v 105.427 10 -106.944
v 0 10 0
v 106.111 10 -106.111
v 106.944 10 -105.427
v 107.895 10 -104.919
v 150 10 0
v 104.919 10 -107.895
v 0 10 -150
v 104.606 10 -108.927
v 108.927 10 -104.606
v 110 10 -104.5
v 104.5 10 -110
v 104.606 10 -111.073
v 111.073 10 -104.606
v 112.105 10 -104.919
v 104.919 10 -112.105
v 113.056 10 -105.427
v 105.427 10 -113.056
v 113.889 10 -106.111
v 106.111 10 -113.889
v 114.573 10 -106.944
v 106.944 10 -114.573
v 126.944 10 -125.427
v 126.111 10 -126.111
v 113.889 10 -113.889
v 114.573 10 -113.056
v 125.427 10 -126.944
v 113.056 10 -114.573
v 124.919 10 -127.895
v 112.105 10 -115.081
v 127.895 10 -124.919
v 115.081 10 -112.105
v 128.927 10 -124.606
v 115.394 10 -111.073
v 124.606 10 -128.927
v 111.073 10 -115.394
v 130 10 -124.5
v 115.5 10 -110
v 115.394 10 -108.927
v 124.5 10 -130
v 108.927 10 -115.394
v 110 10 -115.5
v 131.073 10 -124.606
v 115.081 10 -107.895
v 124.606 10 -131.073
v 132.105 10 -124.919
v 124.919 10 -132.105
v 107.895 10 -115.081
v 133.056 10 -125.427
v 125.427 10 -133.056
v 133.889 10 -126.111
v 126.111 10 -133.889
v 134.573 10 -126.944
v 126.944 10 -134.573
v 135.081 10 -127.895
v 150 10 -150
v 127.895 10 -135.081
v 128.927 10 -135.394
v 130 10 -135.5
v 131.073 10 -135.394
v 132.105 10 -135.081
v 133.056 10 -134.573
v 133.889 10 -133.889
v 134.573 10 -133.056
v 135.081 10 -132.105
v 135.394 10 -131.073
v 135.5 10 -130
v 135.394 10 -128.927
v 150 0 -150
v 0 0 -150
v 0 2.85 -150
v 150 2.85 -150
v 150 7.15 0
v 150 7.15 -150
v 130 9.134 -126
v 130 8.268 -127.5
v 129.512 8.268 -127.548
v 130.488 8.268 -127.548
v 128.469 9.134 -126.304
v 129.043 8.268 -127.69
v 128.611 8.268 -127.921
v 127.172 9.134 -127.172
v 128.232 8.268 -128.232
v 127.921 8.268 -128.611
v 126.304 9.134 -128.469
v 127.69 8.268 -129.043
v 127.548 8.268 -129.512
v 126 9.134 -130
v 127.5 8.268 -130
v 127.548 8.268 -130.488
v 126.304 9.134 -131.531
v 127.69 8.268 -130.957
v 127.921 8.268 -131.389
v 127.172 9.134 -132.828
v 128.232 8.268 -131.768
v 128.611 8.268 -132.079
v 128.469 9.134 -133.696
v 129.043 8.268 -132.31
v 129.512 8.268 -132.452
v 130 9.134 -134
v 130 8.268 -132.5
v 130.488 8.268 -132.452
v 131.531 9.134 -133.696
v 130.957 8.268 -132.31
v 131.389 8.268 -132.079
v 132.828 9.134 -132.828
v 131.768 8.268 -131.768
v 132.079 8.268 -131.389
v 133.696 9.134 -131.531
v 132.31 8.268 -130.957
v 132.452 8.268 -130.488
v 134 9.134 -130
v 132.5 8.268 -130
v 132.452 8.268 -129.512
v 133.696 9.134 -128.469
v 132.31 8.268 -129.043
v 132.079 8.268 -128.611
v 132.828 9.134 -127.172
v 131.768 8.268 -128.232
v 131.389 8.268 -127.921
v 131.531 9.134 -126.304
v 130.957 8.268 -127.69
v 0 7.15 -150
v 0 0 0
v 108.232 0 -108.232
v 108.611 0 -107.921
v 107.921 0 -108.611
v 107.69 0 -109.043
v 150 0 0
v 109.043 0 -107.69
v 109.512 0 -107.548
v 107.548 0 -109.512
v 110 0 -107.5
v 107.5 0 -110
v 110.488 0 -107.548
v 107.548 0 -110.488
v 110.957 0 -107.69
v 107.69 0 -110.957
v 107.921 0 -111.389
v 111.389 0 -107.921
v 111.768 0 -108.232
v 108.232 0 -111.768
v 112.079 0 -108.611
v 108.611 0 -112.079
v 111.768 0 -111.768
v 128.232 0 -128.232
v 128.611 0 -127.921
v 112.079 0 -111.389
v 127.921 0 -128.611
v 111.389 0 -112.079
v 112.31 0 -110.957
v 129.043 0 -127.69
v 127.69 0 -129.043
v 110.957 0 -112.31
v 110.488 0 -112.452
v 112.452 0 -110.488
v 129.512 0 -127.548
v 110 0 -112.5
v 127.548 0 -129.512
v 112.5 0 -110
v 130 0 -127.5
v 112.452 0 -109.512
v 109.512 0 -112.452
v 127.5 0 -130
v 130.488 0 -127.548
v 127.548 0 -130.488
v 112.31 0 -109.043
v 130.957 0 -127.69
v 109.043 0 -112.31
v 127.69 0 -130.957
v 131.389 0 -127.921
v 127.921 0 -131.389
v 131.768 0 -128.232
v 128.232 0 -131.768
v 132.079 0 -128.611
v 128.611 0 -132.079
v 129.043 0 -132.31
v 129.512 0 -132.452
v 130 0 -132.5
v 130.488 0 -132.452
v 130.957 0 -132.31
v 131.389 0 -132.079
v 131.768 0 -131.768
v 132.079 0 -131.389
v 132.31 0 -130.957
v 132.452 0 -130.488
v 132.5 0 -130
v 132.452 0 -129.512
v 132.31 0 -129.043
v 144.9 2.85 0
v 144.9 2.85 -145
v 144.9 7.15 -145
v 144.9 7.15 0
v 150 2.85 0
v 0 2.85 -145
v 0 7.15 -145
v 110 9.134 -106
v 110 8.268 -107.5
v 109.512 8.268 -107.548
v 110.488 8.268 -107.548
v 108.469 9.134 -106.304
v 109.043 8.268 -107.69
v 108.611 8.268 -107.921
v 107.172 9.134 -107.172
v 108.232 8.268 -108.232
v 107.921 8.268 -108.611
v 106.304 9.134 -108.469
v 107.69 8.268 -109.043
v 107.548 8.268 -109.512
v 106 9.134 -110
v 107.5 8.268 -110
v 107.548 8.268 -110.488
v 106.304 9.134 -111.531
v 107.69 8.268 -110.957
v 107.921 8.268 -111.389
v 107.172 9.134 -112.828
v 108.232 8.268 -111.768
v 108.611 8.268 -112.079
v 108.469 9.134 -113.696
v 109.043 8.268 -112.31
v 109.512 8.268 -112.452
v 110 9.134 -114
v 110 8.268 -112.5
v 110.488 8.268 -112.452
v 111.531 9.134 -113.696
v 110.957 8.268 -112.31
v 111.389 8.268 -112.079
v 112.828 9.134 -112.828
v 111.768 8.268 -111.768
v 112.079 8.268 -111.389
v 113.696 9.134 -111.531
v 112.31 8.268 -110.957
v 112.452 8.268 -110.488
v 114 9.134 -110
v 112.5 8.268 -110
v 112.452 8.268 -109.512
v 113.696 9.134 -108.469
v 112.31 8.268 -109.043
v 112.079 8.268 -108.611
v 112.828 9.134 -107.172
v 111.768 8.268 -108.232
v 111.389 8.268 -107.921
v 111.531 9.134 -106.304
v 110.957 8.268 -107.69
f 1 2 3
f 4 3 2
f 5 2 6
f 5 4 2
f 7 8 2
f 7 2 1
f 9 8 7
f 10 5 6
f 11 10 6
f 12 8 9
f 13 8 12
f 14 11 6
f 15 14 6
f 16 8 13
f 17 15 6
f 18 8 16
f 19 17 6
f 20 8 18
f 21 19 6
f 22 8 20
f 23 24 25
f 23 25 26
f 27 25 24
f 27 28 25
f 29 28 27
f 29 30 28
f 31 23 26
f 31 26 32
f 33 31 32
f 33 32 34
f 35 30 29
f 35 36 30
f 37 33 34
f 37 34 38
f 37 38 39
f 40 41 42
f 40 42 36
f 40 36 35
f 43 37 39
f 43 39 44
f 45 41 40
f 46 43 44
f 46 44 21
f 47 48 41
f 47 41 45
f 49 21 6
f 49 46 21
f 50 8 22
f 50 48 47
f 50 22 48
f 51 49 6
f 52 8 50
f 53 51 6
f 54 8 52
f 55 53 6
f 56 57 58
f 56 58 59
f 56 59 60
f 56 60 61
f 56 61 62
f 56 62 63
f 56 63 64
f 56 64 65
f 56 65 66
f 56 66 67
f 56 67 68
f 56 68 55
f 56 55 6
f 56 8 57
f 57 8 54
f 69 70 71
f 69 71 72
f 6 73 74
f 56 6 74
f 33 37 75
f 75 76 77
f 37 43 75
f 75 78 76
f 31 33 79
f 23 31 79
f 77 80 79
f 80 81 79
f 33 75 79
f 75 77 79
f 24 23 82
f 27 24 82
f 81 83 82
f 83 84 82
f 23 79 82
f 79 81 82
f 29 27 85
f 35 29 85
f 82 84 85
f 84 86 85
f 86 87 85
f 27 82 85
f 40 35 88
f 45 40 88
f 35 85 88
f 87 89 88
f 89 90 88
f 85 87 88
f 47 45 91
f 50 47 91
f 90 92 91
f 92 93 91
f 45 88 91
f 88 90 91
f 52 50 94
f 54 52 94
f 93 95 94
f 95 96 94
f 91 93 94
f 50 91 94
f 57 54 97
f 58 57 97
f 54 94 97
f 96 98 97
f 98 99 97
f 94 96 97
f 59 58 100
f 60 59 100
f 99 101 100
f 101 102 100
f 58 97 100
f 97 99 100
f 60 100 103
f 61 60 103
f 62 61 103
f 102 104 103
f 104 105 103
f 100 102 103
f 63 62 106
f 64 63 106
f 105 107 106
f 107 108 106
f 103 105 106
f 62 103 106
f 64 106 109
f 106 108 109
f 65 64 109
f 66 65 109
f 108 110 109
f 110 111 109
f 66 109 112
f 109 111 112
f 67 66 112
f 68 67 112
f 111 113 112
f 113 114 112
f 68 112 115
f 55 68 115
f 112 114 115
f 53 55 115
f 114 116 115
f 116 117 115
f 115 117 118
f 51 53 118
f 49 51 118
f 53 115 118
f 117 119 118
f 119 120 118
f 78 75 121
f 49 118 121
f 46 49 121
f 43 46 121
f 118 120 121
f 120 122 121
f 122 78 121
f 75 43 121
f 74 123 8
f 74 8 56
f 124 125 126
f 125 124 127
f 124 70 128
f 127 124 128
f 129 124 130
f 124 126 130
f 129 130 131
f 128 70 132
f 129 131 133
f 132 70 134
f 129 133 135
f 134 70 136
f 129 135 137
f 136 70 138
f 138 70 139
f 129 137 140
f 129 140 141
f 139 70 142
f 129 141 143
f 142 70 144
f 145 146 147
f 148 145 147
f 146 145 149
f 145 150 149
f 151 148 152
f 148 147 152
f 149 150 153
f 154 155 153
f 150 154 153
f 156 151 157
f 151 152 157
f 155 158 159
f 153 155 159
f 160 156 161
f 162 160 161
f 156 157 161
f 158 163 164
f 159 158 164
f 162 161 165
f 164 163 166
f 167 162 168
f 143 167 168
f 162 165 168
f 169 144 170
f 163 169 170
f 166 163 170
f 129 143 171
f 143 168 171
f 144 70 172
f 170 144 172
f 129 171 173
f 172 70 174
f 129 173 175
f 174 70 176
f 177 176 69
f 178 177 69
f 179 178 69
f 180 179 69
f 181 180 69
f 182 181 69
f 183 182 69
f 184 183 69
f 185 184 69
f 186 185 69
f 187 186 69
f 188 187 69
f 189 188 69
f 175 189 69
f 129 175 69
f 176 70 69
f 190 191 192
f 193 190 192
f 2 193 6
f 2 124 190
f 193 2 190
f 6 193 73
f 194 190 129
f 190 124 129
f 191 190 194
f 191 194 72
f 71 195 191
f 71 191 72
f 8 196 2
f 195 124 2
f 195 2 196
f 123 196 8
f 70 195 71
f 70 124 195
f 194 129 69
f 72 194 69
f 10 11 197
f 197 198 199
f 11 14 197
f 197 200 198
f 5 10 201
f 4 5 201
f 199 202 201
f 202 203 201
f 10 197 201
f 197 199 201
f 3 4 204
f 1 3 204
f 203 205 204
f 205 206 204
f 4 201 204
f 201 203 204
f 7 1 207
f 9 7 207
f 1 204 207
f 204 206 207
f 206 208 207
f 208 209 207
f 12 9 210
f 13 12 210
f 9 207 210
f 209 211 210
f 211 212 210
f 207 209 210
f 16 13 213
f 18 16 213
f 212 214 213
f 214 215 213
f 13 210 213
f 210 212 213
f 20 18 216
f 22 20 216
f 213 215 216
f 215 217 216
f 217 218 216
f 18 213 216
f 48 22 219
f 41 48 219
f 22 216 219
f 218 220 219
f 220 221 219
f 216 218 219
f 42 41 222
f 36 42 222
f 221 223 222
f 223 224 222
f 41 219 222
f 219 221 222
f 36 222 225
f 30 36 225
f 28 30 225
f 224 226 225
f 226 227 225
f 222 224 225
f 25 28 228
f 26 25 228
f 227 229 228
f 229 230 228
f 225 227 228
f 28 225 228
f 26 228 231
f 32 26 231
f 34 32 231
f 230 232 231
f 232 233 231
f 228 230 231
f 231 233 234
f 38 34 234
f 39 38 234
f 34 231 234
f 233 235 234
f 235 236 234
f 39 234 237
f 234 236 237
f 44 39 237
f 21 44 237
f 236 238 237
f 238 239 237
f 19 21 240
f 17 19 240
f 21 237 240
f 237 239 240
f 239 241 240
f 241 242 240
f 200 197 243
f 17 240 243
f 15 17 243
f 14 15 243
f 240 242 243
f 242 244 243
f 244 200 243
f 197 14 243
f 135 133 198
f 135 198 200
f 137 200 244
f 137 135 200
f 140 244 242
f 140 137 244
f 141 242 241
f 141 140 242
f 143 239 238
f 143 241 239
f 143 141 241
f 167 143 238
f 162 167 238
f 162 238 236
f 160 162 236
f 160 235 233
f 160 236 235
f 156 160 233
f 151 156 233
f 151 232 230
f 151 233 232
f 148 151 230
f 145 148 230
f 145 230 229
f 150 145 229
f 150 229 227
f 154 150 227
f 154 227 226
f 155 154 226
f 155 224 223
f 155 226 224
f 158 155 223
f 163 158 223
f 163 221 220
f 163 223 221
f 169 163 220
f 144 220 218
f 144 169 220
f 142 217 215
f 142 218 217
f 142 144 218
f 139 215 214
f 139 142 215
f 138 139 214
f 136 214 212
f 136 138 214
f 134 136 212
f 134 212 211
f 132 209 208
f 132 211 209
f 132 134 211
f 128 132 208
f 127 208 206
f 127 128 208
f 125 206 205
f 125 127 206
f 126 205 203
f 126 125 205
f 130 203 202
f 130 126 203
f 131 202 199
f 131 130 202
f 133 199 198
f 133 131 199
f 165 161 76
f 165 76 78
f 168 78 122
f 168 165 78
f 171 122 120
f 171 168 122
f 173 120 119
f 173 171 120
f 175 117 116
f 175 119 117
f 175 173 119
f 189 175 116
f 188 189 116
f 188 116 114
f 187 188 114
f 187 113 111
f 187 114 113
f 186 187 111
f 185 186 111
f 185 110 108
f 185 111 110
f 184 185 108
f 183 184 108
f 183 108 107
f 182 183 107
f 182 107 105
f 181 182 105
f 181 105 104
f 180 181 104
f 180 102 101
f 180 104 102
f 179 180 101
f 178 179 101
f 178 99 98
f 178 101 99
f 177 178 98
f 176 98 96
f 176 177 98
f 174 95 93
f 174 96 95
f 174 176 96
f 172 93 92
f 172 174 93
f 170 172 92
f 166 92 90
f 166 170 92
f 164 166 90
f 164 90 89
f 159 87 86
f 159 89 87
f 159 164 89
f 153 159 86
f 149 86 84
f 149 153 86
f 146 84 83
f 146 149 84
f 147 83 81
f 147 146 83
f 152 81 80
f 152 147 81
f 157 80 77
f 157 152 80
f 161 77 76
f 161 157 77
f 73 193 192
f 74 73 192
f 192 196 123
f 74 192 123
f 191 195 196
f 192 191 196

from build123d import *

# Parameters (mm, degrees)
SKETCH1_W               = 150
SKETCH1_H               = 150
BOSS_EXTRUDE1_DEPTH     = 10
CUT_EXTRUDE1_DEPTH      = 213.367605816
CUT_EXTRUDE1_DEPTH_BACK = 213.367605816
SKETCH2_W               = 5.1
SKETCH2_H               = 4.3
CUT_EXTRUDE2_DEPTH      = 209.796575642
CUT_EXTRUDE2_DEPTH_BACK = 209.796575642
SKETCH3_W               = 5
SKETCH3_H               = 4.3
CUT_EXTRUDE3_DEPTH      = 213.367605816
CUT_EXTRUDE3_DEPTH_BACK = 213.367605816
SKETCH4_R               = 2.5
CHAMFER1_SIZE           = 3
CHAMFER1_SIZE2          = 1.732050808


with BuildPart() as part:
    # Sketch1 → Boss-Extrude1 (new body)
    with BuildSketch(Plane(origin=(0, 0, 0), x_dir=(1, 0, 0), z_dir=(0, 1, 0))):
        with Locations((75, 75)):
            Rectangle(SKETCH1_W, SKETCH1_H)
    extrude(amount=BOSS_EXTRUDE1_DEPTH)

    # Sketch2 → Cut-Extrude1 (cut, two sides: drawn at the far end of the back side and taken through both)
    with BuildSketch(Plane.XY.offset(-CUT_EXTRUDE1_DEPTH_BACK)):
        with Locations((147.45, 5)):
            Rectangle(SKETCH2_W, SKETCH2_H)
    extrude(amount=CUT_EXTRUDE1_DEPTH + CUT_EXTRUDE1_DEPTH_BACK, mode=Mode.SUBTRACT)

    # Sketch3 → Cut-Extrude2 (cut, two sides: drawn at the far end of the back side and taken through both)
    with BuildSketch(Plane(origin=(144.9, 0, 0), x_dir=(0, 0, -1), z_dir=(1, 0, 0)).offset(-CUT_EXTRUDE2_DEPTH_BACK)):
        with Locations((147.5, 5)):
            Rectangle(SKETCH3_W, SKETCH3_H)
    extrude(amount=CUT_EXTRUDE2_DEPTH + CUT_EXTRUDE2_DEPTH_BACK, mode=Mode.SUBTRACT)

    # Sketch4 → Cut-Extrude3 (cut, two sides: drawn at the far end of the back side and taken through both)
    with BuildSketch(Plane(origin=(0, 10, 0), x_dir=(1, 0, 0), z_dir=(0, 1, 0)).offset(-CUT_EXTRUDE3_DEPTH_BACK)):
        with Locations(Location((130, 130, 0), (0, 0, 270))):
            Circle(SKETCH4_R)
        with Locations(Location((110, 110, 0), (0, 0, 270))):
            Circle(SKETCH4_R)
    extrude(amount=CUT_EXTRUDE3_DEPTH + CUT_EXTRUDE3_DEPTH_BACK, mode=Mode.SUBTRACT)

    # Chamfer1
    chamfer1_edges = [part.edges().sort_by_distance(p)[0] for p in [
        (130, 10, -132.5),
        (110, 10, -112.5),
    ]]
    chamfer1_side = [part.faces().sort_by_distance(p)[0] for p in [
        (74.921322866, 10, -74.921322866),
    ]]
    chamfer(chamfer1_edges, length=CHAMFER1_SIZE, length2=CHAMFER1_SIZE2, reference=chamfer1_side[0])


solid = part.part
